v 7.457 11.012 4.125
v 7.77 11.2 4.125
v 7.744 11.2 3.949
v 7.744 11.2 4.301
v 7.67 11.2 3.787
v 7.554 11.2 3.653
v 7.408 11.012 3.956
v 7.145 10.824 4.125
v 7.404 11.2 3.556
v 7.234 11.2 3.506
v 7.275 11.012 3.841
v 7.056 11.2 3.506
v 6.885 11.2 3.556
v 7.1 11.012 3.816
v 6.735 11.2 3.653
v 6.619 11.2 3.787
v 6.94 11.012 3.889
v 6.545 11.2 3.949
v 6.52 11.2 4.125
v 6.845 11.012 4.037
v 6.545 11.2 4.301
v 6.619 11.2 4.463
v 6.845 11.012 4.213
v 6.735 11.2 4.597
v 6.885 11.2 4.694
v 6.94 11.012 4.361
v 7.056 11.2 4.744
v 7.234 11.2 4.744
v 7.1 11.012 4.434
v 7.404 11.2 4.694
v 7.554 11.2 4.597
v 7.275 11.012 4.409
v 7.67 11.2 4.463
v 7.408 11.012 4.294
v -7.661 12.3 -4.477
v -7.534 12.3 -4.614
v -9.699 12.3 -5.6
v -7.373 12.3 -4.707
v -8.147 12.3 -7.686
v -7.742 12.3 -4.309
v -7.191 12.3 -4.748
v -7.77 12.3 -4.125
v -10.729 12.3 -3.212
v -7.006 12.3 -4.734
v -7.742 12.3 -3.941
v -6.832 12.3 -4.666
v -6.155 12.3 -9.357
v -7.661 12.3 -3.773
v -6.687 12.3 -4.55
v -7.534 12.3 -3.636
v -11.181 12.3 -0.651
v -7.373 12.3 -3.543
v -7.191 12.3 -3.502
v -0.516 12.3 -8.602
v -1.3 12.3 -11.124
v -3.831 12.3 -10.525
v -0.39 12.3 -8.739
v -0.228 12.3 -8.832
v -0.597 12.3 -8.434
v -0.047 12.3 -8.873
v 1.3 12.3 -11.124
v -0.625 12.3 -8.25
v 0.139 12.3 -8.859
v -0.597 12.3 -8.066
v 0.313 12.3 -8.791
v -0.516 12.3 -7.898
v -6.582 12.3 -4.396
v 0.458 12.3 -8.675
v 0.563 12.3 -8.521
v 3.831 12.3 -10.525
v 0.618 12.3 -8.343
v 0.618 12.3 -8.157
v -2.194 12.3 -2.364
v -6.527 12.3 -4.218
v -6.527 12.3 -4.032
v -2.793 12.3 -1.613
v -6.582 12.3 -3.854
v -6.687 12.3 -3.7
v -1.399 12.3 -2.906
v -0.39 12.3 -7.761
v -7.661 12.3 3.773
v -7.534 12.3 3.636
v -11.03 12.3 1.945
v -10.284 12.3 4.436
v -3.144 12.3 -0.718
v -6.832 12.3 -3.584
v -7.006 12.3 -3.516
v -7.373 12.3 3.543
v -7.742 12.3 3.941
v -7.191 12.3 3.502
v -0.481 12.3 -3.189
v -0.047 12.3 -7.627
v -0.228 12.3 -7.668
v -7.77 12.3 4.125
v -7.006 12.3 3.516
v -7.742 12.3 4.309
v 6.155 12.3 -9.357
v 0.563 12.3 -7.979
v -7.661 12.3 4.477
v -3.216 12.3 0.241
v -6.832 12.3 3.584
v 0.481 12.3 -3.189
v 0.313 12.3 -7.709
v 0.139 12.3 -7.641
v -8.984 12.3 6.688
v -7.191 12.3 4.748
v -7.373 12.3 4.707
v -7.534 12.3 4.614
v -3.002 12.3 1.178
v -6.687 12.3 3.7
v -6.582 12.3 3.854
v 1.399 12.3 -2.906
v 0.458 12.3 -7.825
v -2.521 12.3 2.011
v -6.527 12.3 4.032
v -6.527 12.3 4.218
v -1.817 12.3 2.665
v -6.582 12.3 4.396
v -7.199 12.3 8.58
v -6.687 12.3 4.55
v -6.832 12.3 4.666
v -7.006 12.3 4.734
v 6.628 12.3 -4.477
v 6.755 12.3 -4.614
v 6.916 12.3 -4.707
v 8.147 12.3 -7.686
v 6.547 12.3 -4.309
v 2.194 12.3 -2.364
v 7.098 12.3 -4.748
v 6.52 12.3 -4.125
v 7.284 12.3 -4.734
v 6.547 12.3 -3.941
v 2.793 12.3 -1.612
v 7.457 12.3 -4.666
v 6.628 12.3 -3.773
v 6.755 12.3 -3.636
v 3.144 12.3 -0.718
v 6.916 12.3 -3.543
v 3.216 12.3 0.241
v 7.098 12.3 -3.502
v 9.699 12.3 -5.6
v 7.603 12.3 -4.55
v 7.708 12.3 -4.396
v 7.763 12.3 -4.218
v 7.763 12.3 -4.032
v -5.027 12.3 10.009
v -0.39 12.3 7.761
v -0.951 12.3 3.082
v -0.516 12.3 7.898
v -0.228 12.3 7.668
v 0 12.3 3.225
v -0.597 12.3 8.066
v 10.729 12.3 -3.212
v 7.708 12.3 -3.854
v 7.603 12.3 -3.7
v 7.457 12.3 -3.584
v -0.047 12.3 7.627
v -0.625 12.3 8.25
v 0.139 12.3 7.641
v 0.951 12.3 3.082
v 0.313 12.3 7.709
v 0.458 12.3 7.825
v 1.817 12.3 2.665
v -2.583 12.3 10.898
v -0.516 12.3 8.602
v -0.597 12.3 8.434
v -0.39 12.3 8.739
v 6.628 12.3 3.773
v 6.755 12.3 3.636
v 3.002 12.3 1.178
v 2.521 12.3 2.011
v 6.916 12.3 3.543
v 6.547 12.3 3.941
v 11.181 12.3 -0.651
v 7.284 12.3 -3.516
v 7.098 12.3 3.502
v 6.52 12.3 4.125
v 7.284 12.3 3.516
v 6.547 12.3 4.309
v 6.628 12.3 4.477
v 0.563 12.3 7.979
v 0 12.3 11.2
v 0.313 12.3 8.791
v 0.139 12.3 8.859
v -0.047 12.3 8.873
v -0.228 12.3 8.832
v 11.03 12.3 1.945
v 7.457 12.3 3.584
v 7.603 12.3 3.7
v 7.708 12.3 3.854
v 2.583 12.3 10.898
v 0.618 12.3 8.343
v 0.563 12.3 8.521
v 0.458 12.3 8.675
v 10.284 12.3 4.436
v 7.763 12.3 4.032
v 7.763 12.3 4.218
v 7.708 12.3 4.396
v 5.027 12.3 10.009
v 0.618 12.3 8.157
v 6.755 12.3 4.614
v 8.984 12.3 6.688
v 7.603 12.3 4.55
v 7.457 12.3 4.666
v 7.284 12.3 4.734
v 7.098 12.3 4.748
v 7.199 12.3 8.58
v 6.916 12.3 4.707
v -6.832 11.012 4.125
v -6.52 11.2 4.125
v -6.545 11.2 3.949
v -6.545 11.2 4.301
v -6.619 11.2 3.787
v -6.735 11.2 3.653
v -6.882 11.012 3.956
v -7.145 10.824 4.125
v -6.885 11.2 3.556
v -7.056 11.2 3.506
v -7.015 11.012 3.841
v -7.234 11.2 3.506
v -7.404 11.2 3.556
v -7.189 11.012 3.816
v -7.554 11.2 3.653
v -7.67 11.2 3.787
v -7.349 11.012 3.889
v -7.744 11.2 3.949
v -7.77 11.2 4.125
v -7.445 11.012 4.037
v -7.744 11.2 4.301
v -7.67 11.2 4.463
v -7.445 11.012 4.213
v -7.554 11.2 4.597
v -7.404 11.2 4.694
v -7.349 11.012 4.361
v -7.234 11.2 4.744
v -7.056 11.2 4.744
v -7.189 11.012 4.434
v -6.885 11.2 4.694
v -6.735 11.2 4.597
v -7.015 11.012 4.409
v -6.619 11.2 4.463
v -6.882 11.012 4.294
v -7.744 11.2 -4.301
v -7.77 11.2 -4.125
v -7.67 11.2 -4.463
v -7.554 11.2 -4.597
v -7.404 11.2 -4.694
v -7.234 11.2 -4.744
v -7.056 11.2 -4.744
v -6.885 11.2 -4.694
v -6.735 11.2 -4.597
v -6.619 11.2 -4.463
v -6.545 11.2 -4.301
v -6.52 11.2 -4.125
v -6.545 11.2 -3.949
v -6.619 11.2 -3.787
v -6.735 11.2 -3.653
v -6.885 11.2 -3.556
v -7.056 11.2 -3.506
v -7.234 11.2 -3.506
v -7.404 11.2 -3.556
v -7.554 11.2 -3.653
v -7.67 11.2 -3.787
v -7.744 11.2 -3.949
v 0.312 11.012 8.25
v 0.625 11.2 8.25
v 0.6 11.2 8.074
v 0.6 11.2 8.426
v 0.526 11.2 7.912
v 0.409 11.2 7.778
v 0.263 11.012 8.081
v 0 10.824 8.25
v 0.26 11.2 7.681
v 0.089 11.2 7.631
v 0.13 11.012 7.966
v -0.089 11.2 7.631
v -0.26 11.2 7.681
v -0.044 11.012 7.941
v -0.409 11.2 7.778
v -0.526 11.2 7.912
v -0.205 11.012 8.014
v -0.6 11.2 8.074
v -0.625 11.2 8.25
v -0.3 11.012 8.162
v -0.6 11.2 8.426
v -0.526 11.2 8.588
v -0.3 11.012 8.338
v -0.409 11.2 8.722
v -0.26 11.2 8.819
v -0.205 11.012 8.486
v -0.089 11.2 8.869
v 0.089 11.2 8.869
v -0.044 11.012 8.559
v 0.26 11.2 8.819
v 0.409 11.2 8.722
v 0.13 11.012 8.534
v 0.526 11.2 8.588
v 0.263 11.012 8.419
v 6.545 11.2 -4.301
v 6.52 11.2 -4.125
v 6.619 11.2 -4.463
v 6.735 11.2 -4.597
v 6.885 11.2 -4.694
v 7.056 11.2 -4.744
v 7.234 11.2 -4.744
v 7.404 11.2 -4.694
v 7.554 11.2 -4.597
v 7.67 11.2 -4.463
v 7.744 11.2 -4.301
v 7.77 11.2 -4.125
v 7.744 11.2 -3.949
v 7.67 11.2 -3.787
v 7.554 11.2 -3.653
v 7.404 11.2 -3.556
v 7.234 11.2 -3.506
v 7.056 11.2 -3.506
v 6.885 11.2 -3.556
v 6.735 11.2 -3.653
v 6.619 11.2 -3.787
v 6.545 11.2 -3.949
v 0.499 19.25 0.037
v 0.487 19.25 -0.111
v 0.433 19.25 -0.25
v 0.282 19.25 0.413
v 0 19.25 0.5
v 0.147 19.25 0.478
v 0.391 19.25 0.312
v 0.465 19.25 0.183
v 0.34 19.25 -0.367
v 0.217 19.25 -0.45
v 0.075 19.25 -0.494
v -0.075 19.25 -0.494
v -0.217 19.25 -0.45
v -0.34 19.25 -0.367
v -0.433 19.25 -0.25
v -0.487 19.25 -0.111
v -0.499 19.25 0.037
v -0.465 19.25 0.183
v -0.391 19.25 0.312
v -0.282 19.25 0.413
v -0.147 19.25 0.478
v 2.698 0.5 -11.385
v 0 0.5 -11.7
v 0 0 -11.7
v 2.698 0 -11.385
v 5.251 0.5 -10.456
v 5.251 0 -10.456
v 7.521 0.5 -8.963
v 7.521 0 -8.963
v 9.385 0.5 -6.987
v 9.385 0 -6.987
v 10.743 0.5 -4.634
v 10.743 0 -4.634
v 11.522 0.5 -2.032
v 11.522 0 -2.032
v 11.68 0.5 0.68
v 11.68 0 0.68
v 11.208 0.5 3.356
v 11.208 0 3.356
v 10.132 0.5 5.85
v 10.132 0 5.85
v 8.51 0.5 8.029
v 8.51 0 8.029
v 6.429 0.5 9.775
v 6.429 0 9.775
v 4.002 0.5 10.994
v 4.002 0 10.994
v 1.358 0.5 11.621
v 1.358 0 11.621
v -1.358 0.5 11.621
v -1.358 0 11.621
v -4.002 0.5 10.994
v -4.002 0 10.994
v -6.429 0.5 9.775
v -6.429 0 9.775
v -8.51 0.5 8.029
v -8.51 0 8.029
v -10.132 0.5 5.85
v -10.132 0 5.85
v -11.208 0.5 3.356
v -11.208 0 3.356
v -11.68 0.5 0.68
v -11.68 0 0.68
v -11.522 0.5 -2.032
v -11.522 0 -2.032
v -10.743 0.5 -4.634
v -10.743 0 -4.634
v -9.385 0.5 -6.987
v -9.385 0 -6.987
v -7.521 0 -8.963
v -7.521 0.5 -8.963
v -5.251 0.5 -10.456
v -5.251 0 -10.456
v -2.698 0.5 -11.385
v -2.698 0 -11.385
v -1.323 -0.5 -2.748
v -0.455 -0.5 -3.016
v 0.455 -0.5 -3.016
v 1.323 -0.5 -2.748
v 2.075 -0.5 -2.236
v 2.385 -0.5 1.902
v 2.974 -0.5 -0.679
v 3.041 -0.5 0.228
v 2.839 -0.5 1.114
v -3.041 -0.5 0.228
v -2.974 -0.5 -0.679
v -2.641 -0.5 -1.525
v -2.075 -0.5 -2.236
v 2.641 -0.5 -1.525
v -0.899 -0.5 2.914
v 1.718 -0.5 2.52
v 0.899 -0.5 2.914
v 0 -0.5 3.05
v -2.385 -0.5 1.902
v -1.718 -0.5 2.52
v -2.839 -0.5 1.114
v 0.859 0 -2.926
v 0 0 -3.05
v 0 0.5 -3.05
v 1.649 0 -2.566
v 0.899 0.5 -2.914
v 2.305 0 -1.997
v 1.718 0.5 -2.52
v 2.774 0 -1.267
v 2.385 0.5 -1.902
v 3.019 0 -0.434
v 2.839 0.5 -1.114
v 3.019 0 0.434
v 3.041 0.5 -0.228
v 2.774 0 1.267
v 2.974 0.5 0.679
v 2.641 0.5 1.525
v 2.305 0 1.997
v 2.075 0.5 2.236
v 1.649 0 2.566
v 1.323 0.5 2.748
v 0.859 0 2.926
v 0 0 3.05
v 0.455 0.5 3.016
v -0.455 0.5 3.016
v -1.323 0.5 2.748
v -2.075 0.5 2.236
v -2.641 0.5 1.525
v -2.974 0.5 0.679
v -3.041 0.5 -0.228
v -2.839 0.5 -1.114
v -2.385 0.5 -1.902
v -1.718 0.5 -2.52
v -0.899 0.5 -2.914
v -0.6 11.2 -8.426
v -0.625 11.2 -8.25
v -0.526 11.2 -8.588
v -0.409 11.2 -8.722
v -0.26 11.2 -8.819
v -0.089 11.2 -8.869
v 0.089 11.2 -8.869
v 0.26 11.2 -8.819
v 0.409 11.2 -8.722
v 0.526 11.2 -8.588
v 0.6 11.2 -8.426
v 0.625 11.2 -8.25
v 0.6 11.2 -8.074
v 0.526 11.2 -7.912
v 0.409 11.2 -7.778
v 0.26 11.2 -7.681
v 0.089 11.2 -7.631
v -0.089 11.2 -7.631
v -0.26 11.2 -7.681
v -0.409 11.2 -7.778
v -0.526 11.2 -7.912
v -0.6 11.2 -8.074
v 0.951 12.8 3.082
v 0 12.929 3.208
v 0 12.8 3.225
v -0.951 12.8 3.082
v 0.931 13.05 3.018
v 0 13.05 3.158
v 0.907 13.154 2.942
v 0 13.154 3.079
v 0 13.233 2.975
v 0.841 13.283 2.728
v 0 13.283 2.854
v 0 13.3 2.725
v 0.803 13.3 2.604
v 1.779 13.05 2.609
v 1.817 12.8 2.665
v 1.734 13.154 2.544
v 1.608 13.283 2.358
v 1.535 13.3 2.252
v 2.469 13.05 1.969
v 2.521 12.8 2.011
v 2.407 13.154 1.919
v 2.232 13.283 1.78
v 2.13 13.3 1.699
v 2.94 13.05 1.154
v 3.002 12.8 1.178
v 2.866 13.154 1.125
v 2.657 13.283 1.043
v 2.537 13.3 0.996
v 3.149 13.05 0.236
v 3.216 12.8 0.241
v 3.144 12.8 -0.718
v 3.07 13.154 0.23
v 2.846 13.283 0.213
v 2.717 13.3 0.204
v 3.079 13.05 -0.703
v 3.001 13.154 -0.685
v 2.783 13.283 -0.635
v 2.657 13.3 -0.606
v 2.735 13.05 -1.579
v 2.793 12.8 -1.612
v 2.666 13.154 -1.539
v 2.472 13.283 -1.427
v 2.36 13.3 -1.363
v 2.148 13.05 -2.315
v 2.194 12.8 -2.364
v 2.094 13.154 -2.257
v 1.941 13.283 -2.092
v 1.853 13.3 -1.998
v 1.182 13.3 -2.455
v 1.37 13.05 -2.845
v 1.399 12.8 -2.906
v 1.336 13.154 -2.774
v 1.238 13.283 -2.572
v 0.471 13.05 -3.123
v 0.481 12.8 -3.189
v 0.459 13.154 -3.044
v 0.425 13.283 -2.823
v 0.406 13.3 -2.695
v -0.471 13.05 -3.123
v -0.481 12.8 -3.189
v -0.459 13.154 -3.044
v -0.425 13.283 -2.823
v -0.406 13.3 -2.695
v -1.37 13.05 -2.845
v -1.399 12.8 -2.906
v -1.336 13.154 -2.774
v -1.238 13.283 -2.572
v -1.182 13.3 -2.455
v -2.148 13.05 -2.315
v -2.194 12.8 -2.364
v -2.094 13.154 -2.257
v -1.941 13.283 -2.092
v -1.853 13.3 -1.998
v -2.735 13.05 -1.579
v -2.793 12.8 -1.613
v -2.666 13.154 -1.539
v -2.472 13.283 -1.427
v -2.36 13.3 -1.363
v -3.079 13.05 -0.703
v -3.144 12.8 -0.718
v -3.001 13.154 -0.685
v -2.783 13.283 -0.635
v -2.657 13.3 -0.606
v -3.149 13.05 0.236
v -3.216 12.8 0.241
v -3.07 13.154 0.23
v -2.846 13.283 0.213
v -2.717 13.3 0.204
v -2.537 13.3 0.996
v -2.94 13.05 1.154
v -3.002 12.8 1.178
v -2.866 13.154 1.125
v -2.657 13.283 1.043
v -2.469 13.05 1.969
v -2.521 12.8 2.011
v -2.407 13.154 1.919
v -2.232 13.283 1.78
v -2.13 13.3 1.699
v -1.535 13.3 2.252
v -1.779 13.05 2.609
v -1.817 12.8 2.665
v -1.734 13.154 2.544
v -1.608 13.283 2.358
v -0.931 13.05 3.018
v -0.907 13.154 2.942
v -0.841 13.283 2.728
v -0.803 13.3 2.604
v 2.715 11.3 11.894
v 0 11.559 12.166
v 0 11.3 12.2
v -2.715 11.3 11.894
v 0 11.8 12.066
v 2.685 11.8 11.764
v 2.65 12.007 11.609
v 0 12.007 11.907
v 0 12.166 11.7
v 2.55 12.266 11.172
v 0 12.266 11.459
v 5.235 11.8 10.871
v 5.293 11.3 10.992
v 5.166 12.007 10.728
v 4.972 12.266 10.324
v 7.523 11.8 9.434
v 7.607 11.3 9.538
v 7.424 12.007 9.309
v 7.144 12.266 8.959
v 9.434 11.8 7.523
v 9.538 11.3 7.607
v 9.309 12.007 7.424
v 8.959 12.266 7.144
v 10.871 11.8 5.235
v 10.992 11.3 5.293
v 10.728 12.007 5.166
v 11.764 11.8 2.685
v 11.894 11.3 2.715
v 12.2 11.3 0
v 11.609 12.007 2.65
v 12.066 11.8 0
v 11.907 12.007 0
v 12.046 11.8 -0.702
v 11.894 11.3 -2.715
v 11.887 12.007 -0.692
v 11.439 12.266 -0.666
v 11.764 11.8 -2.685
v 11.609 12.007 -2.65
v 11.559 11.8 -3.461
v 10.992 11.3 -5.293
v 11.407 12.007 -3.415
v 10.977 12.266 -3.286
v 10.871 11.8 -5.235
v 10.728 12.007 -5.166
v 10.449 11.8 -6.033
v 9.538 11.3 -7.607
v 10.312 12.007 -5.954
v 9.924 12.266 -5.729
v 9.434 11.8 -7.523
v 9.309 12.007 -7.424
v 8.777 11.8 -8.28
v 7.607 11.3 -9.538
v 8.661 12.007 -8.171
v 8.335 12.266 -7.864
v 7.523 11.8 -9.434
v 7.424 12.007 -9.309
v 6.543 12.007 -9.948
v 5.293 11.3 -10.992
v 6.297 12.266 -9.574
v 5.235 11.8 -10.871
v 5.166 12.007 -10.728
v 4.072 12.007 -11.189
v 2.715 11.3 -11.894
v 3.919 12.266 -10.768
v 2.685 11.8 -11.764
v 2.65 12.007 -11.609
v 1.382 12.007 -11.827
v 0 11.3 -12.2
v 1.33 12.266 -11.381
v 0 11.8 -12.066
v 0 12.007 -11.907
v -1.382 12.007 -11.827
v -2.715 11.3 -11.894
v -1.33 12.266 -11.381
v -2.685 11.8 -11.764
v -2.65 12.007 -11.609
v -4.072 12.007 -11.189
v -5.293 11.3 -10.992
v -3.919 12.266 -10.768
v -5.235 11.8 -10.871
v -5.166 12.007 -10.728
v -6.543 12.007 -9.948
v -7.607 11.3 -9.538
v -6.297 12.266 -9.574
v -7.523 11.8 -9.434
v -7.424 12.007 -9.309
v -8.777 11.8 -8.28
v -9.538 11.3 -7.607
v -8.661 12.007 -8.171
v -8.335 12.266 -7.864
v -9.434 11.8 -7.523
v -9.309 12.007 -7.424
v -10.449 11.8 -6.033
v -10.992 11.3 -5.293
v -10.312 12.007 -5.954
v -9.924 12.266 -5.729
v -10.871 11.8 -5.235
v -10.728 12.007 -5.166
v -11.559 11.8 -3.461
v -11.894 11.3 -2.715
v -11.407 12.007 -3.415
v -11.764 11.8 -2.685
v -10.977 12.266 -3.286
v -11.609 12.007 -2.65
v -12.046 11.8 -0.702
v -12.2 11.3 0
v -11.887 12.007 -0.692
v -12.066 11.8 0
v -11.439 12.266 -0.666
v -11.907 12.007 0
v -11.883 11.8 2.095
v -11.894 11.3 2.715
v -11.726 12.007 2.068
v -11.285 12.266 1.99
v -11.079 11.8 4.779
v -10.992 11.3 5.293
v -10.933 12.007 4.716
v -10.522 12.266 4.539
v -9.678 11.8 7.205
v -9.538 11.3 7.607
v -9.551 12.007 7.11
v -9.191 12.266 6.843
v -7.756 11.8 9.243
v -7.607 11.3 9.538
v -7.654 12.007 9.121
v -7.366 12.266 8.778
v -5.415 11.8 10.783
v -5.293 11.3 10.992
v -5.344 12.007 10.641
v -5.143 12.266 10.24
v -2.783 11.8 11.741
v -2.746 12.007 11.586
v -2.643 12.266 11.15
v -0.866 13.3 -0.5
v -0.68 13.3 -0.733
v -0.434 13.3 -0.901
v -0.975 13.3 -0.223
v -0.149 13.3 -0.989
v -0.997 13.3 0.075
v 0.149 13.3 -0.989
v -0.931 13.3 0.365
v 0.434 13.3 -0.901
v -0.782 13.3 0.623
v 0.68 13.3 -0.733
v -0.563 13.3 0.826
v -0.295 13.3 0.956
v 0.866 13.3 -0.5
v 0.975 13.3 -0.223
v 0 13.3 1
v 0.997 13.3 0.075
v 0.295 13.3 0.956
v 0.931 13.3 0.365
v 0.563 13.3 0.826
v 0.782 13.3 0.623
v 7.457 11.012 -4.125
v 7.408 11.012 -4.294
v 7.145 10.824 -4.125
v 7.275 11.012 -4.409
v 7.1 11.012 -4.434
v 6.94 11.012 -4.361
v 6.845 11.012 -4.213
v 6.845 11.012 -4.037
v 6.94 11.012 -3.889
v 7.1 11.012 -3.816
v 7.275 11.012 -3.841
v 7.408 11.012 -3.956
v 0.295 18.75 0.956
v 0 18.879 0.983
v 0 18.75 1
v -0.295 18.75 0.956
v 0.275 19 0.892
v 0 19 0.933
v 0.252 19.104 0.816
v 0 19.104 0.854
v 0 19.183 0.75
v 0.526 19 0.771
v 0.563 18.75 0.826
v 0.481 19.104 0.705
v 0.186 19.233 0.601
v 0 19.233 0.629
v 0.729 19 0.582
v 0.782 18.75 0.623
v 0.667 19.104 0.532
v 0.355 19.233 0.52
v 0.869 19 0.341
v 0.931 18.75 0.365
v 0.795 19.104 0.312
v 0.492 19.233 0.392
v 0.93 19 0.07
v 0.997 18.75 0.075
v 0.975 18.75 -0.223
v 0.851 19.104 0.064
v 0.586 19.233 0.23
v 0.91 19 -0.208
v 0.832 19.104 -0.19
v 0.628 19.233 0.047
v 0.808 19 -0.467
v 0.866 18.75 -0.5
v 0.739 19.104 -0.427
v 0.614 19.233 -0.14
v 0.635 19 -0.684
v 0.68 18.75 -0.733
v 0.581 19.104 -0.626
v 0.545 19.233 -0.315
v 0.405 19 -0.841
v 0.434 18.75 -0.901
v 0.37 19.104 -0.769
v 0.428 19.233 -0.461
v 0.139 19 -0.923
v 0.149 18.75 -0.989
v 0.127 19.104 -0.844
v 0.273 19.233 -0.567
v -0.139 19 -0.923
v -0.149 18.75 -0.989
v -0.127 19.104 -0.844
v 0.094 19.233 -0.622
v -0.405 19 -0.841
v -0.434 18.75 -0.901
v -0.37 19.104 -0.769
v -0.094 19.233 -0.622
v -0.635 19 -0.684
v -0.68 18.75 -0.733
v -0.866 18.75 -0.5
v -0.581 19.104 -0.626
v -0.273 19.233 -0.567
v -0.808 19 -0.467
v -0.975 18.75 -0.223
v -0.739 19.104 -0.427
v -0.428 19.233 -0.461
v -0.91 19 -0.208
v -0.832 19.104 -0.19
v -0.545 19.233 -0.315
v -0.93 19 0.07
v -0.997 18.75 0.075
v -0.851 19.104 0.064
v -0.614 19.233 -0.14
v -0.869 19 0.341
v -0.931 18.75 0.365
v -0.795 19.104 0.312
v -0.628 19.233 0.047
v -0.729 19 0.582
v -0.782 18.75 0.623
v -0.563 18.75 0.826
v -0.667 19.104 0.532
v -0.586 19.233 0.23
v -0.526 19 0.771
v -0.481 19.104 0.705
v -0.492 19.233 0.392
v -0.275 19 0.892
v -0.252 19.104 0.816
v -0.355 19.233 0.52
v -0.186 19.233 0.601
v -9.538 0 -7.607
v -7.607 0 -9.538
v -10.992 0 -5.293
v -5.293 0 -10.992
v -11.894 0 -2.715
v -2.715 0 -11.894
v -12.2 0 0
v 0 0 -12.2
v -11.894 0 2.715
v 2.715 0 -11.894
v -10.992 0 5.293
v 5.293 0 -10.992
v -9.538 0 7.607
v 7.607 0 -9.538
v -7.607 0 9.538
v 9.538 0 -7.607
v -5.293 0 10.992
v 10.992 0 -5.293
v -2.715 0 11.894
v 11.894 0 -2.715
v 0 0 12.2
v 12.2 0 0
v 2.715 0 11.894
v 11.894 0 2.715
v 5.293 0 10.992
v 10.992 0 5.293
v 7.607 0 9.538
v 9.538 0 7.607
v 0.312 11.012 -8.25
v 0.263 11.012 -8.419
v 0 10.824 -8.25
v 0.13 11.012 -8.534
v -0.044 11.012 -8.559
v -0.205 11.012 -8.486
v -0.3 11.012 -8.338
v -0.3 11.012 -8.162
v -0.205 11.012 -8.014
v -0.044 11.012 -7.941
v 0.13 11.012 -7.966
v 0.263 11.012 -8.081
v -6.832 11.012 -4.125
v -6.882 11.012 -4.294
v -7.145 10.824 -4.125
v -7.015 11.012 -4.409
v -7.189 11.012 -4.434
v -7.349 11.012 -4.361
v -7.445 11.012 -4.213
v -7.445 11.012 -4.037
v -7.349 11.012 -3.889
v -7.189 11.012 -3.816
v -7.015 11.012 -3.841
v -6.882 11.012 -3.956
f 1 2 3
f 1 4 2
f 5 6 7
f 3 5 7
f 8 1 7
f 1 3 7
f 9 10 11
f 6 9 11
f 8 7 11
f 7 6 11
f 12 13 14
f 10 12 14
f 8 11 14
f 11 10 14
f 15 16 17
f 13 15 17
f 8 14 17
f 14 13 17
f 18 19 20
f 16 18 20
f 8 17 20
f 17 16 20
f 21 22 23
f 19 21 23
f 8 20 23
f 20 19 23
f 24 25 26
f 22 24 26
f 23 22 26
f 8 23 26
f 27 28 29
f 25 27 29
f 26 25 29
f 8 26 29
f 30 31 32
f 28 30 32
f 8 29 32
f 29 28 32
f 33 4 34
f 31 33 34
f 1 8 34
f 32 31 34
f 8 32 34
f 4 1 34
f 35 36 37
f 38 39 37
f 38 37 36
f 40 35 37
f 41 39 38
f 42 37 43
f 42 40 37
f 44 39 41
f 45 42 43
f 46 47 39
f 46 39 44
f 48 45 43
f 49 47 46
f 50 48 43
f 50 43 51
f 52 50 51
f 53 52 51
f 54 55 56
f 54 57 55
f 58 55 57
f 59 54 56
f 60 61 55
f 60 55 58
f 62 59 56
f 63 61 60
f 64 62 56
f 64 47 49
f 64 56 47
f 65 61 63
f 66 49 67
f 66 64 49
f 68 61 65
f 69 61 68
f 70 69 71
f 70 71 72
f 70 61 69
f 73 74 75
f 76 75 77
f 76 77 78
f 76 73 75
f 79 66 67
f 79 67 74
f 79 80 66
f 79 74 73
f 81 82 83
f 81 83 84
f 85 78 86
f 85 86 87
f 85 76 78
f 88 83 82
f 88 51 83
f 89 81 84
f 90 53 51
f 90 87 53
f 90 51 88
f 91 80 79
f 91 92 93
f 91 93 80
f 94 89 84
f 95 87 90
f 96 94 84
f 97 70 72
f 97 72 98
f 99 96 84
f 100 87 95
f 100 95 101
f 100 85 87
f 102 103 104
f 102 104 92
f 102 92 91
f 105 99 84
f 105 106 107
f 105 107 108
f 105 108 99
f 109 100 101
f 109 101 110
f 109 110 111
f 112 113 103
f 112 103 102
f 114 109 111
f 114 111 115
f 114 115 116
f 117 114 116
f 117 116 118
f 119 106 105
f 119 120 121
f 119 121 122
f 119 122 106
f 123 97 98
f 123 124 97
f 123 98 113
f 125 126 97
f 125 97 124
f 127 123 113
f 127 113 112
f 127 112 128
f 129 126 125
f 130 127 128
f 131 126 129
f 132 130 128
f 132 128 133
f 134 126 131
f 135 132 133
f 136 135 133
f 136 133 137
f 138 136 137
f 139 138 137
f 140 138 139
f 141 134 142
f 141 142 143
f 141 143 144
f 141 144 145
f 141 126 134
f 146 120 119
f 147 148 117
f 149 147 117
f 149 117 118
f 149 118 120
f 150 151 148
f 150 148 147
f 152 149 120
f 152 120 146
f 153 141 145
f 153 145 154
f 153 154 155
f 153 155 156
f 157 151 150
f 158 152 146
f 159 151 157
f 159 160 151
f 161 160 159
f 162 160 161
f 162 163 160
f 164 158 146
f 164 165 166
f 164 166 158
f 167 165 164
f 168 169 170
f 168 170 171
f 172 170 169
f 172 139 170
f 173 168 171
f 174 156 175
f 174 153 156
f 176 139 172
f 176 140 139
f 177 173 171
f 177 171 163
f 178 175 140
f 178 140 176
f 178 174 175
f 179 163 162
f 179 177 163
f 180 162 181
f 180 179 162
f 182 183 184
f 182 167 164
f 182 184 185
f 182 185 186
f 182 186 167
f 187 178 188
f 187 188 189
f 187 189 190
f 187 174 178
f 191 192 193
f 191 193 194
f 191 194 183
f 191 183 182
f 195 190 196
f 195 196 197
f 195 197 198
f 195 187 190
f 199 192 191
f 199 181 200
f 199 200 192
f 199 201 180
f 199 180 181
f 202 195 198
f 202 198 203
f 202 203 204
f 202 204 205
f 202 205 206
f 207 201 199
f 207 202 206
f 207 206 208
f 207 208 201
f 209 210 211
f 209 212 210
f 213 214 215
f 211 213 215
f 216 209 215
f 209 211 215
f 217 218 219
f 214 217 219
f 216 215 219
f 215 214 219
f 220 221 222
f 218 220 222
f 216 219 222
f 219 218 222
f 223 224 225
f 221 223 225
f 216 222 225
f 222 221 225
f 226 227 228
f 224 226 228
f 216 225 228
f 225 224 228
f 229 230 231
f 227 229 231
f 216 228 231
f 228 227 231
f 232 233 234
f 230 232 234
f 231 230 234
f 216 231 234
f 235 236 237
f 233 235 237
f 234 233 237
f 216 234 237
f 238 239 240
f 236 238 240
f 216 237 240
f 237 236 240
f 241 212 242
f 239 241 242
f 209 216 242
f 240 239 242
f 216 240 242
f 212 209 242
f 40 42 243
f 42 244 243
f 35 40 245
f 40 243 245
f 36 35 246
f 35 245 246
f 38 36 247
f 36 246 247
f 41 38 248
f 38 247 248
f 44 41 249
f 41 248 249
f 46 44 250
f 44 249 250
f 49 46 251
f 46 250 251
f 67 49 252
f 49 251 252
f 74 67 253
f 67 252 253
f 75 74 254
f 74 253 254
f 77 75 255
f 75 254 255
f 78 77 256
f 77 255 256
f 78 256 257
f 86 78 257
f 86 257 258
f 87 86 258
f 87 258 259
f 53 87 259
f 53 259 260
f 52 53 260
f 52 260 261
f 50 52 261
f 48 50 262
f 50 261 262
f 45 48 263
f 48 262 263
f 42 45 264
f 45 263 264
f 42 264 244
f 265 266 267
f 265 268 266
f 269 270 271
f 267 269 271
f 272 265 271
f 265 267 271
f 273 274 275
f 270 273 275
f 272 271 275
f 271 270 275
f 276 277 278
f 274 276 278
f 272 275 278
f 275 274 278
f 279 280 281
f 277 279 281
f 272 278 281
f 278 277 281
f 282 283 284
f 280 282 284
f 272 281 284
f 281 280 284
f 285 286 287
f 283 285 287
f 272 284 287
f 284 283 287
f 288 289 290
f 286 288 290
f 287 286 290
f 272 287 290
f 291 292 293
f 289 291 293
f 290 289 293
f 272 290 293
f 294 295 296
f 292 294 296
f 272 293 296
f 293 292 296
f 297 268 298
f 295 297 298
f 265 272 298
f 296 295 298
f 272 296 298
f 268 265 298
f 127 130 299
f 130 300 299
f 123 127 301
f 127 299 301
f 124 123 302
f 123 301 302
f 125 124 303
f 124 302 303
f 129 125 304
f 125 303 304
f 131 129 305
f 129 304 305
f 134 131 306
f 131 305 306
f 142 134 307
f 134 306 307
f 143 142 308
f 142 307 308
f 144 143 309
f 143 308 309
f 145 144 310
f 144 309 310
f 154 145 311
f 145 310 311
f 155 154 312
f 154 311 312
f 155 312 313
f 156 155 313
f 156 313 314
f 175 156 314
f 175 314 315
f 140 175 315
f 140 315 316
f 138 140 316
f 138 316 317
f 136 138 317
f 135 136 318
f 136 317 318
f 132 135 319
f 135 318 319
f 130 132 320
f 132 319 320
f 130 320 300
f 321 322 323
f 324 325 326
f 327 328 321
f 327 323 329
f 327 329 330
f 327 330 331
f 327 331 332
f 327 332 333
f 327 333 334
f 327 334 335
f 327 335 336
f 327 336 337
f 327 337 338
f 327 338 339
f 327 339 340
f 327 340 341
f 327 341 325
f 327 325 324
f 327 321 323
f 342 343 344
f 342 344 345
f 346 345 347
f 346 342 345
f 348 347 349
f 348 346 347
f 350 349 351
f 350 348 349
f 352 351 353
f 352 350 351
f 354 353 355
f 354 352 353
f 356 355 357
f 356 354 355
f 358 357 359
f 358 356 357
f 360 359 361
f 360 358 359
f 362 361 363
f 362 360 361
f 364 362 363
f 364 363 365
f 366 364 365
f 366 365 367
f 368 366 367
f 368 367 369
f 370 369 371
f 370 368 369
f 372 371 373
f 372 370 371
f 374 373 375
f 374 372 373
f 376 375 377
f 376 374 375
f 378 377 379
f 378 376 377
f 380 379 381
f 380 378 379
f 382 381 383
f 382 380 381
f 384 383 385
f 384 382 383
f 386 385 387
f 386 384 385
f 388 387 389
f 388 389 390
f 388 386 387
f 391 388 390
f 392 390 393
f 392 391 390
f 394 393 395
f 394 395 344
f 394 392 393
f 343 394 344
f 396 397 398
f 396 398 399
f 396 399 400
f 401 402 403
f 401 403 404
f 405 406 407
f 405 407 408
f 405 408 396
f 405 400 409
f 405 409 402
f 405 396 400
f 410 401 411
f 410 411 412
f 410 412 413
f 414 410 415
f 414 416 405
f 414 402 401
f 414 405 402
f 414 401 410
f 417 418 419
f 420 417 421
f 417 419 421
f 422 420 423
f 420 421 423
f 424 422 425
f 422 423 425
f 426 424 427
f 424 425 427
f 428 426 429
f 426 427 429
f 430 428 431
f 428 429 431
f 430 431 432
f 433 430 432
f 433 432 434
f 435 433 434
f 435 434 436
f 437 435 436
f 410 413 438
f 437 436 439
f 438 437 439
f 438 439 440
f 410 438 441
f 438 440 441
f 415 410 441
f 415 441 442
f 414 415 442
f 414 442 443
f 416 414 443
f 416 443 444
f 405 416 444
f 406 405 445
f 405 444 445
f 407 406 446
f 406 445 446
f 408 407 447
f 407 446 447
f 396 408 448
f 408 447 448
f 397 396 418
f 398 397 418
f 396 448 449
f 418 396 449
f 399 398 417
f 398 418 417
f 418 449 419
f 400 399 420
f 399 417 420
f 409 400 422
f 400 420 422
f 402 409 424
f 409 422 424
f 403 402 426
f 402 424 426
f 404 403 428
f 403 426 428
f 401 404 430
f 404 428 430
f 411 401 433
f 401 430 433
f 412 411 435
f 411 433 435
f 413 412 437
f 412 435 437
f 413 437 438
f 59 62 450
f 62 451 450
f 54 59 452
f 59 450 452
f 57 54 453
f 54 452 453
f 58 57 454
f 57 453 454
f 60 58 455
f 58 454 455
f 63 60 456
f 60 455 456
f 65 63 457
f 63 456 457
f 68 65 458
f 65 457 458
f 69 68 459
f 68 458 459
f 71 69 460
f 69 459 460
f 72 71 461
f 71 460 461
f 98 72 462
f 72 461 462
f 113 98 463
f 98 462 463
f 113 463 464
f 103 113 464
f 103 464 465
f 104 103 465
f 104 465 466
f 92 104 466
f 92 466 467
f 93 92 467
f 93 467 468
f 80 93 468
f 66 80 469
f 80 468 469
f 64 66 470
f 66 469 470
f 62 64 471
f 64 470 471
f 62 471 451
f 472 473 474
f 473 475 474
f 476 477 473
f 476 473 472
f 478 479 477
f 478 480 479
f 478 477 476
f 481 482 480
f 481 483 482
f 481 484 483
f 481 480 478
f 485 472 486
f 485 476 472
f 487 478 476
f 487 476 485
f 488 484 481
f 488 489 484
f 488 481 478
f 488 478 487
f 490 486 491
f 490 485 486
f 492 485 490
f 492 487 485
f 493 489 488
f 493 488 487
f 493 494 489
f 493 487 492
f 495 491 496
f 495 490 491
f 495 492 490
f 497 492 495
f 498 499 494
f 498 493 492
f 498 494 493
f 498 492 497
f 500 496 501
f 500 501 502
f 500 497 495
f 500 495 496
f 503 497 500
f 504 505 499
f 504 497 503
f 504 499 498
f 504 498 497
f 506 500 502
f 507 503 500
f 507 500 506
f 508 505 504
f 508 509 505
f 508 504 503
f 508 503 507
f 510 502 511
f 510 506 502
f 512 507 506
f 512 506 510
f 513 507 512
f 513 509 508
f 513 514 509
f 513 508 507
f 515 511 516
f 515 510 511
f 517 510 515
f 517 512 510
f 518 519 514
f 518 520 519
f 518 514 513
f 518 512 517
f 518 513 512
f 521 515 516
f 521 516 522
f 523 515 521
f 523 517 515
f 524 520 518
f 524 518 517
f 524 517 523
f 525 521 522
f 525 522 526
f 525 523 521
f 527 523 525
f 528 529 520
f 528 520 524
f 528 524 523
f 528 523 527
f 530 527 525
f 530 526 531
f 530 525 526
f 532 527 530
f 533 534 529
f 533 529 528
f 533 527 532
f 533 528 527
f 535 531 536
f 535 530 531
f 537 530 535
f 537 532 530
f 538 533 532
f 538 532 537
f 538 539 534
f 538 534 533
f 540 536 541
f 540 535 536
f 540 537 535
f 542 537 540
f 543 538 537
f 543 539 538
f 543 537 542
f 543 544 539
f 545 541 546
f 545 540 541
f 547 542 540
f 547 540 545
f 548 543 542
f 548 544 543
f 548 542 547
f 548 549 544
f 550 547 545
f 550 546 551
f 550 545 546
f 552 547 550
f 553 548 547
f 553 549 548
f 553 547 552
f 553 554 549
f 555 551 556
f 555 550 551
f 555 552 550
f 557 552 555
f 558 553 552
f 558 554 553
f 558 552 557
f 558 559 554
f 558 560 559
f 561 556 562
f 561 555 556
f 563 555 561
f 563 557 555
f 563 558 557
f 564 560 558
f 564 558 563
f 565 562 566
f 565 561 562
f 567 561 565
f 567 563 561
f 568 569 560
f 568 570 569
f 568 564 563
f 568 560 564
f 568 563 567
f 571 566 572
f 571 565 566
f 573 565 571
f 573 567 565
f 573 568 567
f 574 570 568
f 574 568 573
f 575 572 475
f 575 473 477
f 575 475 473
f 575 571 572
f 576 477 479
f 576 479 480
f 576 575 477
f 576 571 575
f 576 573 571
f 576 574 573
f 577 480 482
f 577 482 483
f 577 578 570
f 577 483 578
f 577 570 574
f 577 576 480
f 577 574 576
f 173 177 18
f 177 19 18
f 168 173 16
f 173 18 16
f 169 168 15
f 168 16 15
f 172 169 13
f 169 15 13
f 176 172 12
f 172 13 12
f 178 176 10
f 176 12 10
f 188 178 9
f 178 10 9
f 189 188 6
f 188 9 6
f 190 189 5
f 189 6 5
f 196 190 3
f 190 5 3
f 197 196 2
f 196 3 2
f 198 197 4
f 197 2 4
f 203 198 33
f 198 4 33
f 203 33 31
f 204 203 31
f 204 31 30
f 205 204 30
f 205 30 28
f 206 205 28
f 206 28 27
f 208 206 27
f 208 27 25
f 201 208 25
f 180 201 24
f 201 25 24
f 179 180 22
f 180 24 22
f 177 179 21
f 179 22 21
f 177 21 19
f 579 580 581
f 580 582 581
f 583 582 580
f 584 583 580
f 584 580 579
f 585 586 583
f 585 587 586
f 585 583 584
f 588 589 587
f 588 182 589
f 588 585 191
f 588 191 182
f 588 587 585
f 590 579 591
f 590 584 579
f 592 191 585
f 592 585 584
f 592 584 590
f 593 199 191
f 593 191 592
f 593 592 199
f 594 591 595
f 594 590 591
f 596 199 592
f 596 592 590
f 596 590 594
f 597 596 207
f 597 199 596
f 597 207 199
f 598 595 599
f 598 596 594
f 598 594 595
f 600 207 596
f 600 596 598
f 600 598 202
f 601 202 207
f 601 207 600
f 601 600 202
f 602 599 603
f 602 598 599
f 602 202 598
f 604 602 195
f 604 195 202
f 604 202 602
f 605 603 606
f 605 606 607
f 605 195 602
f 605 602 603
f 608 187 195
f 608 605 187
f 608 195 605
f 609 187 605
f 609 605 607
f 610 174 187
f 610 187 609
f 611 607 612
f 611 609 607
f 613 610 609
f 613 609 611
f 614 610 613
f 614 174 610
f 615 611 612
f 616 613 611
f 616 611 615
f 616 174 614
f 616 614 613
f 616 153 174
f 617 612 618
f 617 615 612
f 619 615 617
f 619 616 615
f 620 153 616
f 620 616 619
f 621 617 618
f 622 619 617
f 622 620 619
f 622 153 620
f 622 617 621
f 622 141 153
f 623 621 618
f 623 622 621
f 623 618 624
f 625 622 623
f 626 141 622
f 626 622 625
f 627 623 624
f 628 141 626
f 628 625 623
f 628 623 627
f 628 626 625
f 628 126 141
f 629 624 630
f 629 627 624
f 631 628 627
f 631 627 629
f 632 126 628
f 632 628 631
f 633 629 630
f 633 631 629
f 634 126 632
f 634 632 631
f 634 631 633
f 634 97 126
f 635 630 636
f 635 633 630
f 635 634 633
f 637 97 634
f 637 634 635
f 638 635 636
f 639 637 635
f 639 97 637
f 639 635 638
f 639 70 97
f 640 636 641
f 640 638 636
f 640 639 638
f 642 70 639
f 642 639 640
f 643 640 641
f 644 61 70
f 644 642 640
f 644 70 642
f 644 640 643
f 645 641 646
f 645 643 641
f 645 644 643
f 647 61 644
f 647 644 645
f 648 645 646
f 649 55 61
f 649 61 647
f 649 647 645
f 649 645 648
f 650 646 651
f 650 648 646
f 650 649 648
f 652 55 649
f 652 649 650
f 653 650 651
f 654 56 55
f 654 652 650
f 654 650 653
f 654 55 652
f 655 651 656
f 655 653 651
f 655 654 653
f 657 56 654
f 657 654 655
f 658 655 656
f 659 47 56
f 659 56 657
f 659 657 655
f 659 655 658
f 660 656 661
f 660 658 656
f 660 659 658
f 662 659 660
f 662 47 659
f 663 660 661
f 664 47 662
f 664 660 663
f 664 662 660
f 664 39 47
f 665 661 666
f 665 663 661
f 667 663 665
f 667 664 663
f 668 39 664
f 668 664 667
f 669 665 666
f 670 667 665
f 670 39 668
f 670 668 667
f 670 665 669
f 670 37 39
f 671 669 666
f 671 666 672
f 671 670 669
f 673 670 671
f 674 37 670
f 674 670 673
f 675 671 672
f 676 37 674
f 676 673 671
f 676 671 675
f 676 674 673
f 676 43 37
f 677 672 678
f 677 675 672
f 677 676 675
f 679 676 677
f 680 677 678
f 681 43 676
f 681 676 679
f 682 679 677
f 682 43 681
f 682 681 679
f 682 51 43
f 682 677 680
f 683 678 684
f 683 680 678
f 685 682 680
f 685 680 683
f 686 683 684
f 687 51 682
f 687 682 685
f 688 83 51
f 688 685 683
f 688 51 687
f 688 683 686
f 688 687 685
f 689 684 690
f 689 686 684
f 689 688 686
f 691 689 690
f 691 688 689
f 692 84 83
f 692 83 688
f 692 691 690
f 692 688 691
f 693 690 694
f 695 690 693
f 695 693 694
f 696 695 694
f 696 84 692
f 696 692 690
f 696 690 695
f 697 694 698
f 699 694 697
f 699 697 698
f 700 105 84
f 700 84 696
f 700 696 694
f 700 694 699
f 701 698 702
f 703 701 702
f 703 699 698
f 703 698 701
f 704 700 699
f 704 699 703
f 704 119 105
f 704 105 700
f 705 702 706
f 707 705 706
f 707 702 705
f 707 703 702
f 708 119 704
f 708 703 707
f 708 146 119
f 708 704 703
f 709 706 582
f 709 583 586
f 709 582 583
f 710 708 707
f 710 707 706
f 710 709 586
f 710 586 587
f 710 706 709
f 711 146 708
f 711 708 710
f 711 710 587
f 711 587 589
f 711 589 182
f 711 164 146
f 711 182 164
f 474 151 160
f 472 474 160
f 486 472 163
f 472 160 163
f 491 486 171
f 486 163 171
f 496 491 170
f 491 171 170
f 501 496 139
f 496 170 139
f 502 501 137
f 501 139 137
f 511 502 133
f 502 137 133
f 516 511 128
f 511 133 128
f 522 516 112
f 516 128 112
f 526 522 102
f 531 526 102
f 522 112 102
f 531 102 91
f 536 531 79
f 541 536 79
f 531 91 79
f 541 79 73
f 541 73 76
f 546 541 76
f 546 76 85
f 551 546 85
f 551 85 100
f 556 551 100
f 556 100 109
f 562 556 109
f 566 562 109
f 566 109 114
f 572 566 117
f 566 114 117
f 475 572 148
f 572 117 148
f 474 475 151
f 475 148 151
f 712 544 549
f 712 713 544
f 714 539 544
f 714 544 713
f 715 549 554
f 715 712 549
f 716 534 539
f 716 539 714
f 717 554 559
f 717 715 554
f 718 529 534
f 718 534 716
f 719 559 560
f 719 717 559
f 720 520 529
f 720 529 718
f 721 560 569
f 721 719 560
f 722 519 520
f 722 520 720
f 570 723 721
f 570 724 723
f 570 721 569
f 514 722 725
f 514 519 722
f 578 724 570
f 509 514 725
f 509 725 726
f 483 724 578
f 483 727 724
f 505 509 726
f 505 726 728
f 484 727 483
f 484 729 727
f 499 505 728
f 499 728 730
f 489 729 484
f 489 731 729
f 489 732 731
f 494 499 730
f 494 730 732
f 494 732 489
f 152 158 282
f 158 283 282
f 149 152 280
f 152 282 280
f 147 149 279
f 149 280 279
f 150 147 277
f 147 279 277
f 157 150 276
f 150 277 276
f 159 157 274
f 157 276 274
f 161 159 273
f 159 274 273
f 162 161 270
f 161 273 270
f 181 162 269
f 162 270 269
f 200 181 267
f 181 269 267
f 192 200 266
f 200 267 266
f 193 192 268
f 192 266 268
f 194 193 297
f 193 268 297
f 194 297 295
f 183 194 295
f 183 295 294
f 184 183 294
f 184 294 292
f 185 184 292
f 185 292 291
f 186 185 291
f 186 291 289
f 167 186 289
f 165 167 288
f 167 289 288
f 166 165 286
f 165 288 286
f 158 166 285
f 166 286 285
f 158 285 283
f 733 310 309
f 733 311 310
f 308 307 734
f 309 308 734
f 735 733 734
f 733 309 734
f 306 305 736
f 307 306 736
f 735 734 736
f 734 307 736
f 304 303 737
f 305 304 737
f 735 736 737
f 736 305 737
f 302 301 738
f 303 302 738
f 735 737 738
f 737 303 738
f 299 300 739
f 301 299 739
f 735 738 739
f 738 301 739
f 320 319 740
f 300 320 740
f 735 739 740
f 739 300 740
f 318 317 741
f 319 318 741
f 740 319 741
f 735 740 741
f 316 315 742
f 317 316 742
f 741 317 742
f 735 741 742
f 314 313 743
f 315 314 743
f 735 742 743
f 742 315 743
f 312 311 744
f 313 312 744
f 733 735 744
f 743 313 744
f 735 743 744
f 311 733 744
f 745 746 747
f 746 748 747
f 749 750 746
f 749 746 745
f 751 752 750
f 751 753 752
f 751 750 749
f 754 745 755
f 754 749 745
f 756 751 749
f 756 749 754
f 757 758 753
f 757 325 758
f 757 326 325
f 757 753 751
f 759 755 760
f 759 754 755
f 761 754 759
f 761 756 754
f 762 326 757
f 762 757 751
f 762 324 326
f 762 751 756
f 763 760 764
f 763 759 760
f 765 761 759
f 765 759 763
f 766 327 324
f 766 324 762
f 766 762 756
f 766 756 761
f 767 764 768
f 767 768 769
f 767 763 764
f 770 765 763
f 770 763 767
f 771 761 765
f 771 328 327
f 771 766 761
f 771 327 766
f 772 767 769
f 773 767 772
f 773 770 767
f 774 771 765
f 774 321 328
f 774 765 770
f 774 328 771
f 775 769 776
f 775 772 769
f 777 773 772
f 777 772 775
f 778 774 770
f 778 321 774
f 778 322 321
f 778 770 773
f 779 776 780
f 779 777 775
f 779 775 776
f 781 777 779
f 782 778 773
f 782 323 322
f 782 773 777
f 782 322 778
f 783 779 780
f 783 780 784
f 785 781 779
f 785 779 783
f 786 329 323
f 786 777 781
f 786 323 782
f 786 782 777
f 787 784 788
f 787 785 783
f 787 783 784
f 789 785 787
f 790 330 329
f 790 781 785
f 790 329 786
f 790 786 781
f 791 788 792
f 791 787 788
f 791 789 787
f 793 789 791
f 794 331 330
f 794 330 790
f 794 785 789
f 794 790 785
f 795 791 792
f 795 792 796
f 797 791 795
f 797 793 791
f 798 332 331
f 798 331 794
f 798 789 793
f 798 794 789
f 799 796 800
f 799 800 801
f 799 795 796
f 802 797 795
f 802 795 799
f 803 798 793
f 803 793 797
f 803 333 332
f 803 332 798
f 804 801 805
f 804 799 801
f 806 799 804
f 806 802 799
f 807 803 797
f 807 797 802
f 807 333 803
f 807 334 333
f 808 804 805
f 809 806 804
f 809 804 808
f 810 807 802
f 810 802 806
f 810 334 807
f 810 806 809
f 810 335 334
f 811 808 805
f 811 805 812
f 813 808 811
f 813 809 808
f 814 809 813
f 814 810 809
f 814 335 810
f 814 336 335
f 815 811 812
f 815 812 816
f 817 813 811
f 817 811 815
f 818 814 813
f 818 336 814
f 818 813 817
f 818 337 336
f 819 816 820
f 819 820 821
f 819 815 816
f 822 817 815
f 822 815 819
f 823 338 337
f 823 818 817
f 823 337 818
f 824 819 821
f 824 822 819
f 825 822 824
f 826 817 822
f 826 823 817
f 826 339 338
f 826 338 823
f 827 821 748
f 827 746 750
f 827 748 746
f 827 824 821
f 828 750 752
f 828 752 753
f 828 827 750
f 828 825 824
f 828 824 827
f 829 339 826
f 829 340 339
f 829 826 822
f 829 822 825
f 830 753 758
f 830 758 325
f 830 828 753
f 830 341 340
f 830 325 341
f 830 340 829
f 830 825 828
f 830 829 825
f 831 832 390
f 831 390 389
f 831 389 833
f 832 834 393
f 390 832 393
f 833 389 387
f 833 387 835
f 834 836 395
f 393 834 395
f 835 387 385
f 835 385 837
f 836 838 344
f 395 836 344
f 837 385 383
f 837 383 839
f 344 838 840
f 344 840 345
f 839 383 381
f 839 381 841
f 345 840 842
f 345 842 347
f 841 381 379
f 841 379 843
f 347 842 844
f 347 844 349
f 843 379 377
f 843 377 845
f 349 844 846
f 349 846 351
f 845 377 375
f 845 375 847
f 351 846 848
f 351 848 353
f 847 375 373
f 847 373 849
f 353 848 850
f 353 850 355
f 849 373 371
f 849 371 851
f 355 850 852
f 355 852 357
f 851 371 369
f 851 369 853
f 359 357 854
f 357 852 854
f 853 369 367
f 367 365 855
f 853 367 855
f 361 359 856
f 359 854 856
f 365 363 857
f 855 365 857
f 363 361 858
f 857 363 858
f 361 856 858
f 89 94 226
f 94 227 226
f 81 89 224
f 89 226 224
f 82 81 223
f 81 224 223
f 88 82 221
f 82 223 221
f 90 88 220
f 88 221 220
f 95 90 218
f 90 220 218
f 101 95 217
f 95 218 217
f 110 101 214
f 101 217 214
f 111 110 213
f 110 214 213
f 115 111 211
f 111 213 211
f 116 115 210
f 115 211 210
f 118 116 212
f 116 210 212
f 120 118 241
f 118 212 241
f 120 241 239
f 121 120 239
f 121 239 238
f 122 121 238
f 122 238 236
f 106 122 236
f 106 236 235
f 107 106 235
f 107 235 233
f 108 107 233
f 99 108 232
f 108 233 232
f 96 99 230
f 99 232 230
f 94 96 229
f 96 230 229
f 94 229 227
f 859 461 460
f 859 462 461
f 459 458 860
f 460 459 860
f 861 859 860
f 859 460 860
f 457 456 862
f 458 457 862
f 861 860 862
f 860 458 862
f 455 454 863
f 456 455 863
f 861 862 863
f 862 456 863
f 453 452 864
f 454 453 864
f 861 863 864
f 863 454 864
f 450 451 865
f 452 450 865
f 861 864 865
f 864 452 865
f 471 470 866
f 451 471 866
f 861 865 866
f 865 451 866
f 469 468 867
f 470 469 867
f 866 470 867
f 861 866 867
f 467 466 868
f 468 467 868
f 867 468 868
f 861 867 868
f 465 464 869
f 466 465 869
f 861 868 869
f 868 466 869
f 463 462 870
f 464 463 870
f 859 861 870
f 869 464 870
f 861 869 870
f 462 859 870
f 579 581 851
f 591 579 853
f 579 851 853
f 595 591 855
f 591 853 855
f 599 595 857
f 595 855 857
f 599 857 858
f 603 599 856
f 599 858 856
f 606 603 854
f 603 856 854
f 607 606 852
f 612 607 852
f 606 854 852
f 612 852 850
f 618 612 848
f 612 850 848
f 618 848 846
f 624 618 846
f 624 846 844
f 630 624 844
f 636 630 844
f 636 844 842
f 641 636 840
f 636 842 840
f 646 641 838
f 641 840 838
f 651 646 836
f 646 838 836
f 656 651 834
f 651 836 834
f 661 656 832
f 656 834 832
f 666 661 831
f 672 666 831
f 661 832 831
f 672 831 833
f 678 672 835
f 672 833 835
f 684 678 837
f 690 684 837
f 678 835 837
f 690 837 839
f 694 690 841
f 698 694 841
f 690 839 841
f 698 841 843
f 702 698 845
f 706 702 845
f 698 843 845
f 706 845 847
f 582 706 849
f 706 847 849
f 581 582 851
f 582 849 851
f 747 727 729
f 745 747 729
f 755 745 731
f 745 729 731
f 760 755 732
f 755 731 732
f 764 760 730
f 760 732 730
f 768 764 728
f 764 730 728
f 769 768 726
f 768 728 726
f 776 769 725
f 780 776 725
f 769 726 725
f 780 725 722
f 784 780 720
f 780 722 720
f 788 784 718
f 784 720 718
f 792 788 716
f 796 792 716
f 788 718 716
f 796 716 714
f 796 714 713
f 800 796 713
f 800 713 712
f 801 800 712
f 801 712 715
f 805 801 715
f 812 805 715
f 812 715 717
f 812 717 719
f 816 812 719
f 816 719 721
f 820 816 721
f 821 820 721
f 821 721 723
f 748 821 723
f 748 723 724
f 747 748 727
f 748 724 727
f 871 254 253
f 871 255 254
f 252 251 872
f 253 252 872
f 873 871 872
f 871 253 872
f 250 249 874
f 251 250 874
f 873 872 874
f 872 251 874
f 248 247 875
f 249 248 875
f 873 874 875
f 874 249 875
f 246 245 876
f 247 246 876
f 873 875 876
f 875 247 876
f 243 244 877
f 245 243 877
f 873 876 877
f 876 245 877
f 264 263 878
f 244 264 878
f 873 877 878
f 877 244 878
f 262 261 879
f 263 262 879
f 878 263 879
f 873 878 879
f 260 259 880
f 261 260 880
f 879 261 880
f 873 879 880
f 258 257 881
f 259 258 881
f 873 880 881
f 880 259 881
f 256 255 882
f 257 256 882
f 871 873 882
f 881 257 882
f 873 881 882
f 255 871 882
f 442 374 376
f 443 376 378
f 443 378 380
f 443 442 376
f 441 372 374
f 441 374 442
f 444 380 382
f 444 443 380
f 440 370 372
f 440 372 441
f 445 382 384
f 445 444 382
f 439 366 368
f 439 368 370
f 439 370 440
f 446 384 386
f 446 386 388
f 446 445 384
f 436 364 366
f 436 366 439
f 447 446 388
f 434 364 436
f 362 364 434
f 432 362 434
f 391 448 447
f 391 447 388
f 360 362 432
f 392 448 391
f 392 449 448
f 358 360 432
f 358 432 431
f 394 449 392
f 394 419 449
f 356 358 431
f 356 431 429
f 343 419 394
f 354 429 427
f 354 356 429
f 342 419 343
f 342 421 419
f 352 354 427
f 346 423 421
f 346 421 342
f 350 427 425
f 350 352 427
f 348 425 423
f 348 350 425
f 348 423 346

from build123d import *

# Parameters (mm, degrees)
SKETCH1_R                          = 12.2
BOSS_EXTRUDE1_DEPTH                = 12.3
SKETCH2_R                          = 3.225
BOSS_EXTRUDE2_DEPTH                = 1
SKETCH3_R                          = 3.05
BOSS_EXTRUDE3_DEPTH                = 0.5
SKETCH4_R                          = 1
BOSS_EXTRUDE4_DEPTH                = 5.95
FILLET1_R                          = 1
FILLET2_R                          = 0.5
TAP_DRILL_FOR_M1_6X0_35_TAP1_D     = 1.25
TAP_DRILL_FOR_M1_6X0_35_TAP1_DEPTH = 1.1
TAP_DRILL_FOR_M1_6X0_35_TAP1_TIP   = 0.375537887
CUT_EXTRUDE1_START                 = -0.5
SKETCH8_R                          = 11.7
SKETCH8_R_2                        = 3.05
CUT_EXTRUDE1_DEPTH                 = 0.5


with BuildPart() as part:
    # Sketch1 → Boss-Extrude1 (new body)
    with BuildSketch(Plane(origin=(0, 0, 0), x_dir=(1, 0, 0), z_dir=(0, 1, 0))):
        with Locations(Location((0, 0, 0), (0, 0, 270))):
            Circle(SKETCH1_R)
    extrude(amount=BOSS_EXTRUDE1_DEPTH)

    # Sketch2 → Boss-Extrude2 (add)
    with BuildSketch(Plane(origin=(0, 12.3, 0), x_dir=(1, 0, 0), z_dir=(0, 1, 0))):
        with Locations(Location((0, 0, 0), (0, 0, 270))):
            Circle(SKETCH2_R)
    extrude(amount=BOSS_EXTRUDE2_DEPTH)

    # Sketch3 → Boss-Extrude3 (add)
    with BuildSketch(Plane.XZ):
        with Locations(Location((0, 0, 0), (0, 0, 90))):
            Circle(SKETCH3_R)
    extrude(amount=BOSS_EXTRUDE3_DEPTH)

    # Sketch4 → Boss-Extrude4 (add)
    with BuildSketch(Plane(origin=(0, 13.3, 0), x_dir=(1, 0, 0), z_dir=(0, 1, 0))):
        with Locations(Location((0, 0, 0), (0, 0, 270))):
            Circle(SKETCH4_R)
    extrude(amount=BOSS_EXTRUDE4_DEPTH)

    # Fillet1
    fillet1_edges = [part.edges().sort_by_distance(p)[0] for p in [
        (0, 12.3, -12.2),
    ]]
    fillet(fillet1_edges, radius=FILLET1_R)

    # Fillet2
    fillet2_edges = [part.edges().sort_by_distance(p)[0] for p in [
        (0, 19.25, -1),
        (0, 13.3, -3.225),
    ]]
    fillet(fillet2_edges, radius=FILLET2_R)

    # Tap Drill for M1.6x0.35 Tap1
    with Locations(Plane(origin=(0, 12.3, 0), x_dir=(1, 0, 0), z_dir=(0, 1, 0))):
        with Locations((0, -8.25), (-7.144709581, -4.125), (-7.144709581, 4.125), (0, 8.25), (7.144709581, 4.125), (7.144709581, -4.125)):
            Hole(TAP_DRILL_FOR_M1_6X0_35_TAP1_D / 2, depth=TAP_DRILL_FOR_M1_6X0_35_TAP1_DEPTH)
            with Locations((0, 0, -(TAP_DRILL_FOR_M1_6X0_35_TAP1_DEPTH + TAP_DRILL_FOR_M1_6X0_35_TAP1_TIP / 2))):  # 118° drill point
                Cone(0, TAP_DRILL_FOR_M1_6X0_35_TAP1_D / 2, TAP_DRILL_FOR_M1_6X0_35_TAP1_TIP, mode=Mode.SUBTRACT)

    # Sketch8 → Cut-Extrude1 (cut)
    with BuildSketch(Plane.XZ.offset(CUT_EXTRUDE1_START)):
        with Locations(Location((0, 0, 0), (0, 0, 270))):
            Circle(SKETCH8_R)
        with Locations(Location((0, 0, 0), (0, 0, 270))):
            Circle(SKETCH8_R_2, mode=Mode.SUBTRACT)
    extrude(amount=CUT_EXTRUDE1_DEPTH, mode=Mode.SUBTRACT)


solid = part.part
